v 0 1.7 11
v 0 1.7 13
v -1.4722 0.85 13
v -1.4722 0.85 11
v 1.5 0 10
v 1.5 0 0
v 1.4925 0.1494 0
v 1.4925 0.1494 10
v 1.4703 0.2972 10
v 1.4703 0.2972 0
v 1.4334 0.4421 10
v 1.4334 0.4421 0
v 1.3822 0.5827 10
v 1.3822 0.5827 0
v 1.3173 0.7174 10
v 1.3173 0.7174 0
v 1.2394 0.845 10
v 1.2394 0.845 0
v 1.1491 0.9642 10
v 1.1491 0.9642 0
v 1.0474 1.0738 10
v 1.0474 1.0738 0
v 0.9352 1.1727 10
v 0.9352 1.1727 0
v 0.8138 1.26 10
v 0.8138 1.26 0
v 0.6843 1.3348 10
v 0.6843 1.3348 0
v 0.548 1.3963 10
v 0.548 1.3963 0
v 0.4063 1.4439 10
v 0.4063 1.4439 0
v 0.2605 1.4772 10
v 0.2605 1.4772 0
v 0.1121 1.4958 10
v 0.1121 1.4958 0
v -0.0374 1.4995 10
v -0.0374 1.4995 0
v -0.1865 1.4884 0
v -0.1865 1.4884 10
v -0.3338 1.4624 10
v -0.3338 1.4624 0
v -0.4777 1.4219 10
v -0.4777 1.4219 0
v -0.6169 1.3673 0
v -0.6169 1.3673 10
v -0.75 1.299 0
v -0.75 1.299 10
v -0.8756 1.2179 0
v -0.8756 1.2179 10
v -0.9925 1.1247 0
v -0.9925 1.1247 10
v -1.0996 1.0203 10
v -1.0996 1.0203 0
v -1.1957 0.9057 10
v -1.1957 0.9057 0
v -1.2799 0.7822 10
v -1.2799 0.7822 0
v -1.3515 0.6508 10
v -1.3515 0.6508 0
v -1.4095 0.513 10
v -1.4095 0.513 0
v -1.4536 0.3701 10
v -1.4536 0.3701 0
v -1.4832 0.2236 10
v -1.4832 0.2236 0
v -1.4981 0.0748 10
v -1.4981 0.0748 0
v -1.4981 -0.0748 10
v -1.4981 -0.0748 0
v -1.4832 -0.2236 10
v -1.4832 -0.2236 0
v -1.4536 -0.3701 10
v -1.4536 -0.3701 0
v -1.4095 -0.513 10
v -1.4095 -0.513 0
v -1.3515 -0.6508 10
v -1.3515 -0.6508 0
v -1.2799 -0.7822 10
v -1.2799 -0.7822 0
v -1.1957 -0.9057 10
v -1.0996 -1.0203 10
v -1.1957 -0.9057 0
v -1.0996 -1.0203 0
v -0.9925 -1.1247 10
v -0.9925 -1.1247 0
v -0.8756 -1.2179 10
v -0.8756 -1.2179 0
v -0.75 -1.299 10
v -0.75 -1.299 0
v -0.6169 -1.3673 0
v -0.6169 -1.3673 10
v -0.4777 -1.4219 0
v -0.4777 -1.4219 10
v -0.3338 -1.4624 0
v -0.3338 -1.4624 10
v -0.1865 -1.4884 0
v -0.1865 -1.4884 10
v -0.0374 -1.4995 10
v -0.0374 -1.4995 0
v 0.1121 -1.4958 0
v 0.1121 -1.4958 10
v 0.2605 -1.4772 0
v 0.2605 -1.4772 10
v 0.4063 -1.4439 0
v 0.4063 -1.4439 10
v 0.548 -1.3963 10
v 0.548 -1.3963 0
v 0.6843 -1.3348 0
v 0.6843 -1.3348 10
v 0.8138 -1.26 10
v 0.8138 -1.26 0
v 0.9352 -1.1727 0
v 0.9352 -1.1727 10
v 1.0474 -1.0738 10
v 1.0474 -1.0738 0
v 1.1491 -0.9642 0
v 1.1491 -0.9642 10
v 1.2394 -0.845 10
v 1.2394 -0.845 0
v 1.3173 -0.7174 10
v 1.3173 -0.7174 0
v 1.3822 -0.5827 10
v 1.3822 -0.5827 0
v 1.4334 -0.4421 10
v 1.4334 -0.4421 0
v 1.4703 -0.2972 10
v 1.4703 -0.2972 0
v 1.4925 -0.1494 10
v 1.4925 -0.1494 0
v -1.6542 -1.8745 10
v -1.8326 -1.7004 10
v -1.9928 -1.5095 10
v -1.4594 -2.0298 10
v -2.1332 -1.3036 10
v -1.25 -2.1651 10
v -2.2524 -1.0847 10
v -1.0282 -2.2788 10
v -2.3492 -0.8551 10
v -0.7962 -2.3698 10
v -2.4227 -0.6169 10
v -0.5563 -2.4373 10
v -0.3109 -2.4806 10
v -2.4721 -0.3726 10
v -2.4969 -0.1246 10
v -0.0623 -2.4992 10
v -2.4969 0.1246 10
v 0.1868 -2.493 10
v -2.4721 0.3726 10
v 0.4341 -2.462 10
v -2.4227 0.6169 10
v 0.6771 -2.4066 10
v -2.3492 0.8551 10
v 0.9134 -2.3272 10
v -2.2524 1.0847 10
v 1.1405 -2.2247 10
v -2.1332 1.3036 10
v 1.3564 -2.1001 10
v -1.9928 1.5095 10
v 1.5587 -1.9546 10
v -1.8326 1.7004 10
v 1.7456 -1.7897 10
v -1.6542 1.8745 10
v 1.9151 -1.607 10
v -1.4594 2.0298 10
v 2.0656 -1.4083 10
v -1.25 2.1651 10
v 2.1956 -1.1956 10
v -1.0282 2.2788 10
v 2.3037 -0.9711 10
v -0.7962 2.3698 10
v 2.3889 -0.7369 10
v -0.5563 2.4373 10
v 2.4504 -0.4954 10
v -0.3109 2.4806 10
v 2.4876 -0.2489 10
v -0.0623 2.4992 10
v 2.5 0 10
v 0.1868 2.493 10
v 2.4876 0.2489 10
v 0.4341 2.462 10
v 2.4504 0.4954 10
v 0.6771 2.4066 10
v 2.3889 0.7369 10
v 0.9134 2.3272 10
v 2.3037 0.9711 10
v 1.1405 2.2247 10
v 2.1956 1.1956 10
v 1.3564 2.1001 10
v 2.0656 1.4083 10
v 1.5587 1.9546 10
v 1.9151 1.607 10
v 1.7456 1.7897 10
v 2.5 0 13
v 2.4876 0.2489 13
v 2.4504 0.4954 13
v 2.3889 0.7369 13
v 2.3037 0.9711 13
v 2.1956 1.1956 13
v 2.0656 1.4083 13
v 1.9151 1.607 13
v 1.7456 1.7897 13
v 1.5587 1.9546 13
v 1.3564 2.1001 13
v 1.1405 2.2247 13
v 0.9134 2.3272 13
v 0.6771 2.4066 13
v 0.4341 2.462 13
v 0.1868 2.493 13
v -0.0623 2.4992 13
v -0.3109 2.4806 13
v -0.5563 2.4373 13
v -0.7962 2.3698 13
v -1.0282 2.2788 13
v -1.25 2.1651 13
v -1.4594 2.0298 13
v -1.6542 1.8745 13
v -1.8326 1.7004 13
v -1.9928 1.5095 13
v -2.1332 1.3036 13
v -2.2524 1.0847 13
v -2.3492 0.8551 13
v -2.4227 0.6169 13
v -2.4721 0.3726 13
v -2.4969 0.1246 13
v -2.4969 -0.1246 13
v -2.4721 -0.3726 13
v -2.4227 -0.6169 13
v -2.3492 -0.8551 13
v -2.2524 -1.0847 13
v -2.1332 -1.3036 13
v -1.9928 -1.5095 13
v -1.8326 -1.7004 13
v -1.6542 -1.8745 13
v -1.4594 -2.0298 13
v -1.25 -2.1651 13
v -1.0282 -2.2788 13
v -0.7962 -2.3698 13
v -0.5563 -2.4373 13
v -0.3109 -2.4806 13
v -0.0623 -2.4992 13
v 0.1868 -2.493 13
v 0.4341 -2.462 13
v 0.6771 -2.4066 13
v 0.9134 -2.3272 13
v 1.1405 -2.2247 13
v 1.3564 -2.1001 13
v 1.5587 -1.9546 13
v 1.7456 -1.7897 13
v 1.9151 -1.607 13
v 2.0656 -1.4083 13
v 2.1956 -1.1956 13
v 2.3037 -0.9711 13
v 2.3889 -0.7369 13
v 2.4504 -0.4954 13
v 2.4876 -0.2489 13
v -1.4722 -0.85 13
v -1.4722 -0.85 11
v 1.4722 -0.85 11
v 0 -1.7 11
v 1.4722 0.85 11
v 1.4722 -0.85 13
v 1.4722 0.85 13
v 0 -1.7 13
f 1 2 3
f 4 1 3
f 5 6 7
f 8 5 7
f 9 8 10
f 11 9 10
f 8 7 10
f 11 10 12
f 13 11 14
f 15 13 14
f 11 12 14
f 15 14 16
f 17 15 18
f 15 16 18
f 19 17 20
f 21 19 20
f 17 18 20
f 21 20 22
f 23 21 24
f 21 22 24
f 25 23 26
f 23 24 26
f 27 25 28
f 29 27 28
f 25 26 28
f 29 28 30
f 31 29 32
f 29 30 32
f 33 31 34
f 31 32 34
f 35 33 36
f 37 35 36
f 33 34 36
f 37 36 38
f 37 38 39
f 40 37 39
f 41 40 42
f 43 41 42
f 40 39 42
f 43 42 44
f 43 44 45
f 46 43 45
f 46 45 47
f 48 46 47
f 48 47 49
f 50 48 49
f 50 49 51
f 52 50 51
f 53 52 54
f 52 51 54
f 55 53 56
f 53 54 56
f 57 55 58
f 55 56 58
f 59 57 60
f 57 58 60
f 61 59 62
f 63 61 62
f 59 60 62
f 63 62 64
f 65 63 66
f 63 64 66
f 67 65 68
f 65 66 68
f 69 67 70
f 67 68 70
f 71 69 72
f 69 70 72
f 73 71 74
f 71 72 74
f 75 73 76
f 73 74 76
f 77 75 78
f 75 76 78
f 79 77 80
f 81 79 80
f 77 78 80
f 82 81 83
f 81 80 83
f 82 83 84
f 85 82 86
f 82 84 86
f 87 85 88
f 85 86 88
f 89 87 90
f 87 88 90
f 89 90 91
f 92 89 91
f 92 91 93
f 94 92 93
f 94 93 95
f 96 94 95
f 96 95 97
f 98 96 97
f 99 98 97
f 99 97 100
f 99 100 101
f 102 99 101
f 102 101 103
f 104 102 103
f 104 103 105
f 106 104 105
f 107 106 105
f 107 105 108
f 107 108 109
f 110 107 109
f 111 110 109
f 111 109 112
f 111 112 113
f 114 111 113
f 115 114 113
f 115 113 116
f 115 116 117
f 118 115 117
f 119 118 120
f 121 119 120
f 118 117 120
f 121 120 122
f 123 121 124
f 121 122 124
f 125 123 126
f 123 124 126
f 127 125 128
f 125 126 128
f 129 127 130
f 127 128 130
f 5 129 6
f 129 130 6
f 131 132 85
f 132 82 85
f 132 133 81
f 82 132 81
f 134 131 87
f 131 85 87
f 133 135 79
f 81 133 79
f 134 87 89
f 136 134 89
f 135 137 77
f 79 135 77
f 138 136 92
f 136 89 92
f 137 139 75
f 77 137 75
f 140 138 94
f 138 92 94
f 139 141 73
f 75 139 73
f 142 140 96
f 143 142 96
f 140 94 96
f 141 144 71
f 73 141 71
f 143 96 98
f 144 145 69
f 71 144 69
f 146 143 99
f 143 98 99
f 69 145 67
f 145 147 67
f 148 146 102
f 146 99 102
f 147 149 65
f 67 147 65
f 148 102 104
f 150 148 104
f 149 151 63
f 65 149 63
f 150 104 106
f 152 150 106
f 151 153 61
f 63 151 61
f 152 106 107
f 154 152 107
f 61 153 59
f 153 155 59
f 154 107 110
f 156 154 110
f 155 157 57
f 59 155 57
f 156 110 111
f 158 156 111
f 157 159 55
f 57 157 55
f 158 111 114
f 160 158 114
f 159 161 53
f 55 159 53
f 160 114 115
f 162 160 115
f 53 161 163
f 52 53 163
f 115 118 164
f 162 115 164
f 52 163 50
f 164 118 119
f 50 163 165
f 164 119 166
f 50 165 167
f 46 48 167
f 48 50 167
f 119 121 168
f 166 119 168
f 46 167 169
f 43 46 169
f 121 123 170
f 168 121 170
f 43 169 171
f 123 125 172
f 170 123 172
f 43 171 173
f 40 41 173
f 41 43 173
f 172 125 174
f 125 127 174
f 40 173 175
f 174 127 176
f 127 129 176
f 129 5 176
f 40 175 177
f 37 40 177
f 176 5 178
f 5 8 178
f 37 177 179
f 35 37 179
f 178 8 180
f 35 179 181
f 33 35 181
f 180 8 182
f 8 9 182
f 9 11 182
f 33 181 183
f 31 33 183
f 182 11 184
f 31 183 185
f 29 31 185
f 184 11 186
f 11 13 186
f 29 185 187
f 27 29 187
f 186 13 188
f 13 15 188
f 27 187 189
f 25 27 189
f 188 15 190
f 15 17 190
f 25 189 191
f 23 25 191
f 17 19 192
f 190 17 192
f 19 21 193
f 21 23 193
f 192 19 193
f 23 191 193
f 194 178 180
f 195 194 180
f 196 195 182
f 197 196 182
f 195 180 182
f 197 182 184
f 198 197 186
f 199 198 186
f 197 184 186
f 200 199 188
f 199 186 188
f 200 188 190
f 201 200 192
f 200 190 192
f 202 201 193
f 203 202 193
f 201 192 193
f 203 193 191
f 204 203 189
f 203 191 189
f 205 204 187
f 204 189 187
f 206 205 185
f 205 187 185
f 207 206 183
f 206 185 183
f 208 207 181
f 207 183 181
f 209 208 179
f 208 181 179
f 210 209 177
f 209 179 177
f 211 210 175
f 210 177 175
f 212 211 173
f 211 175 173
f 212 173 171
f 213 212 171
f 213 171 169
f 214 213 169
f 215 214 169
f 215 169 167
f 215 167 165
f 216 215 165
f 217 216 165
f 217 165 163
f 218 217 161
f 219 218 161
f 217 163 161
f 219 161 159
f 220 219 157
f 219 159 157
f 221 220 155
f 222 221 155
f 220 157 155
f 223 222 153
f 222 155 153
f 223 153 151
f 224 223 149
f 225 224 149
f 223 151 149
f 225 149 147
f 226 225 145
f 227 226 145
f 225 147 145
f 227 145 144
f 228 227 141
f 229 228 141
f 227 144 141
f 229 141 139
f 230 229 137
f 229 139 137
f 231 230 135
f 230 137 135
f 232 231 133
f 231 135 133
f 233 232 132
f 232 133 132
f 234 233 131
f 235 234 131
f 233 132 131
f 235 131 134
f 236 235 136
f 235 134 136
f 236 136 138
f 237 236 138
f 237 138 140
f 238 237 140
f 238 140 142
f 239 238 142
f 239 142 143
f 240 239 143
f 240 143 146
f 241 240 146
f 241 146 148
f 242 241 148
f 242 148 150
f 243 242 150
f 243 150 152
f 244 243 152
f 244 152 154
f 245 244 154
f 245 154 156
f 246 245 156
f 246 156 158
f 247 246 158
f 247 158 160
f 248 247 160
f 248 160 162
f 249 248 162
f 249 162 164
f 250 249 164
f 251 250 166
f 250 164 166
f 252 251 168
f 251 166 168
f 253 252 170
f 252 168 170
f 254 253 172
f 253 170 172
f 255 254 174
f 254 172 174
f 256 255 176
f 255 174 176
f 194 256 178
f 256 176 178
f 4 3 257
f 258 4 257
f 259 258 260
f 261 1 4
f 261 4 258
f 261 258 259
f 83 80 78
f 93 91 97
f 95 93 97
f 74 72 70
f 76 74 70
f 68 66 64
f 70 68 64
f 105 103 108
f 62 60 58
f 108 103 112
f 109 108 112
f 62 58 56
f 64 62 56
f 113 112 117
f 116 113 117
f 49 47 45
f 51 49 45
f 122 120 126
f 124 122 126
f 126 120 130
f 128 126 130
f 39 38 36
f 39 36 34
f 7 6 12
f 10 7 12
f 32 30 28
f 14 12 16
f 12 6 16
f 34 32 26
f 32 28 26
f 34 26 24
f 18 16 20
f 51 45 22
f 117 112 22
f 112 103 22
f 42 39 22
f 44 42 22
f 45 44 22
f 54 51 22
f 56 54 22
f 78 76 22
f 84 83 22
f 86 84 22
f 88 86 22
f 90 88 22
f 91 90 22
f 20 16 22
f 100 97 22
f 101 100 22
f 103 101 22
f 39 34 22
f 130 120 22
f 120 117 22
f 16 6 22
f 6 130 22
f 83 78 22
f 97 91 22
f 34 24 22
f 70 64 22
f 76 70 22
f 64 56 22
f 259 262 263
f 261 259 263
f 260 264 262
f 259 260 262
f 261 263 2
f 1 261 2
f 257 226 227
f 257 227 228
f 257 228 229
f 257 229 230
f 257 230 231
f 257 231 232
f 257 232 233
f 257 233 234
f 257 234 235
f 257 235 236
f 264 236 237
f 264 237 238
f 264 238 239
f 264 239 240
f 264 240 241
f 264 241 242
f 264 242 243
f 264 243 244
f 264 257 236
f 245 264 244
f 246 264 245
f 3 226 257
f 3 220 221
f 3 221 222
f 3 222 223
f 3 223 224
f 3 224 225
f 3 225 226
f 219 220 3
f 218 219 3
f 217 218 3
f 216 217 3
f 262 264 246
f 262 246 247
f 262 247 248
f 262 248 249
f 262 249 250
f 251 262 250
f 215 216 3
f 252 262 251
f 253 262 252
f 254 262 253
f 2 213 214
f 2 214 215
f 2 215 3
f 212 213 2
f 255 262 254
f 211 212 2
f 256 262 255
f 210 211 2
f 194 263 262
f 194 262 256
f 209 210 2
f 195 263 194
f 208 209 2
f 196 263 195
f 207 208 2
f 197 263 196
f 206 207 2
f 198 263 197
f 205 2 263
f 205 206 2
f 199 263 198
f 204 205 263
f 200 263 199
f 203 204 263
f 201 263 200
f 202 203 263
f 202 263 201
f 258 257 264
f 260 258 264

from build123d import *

# Parameters (mm, degrees)
SKETCH_1_R          = 1.5
EXTRUDE_1_DEPTH     = 10
SKETCH_2_R          = 2.5
EXTRUDE_2_DEPTH     = 3
CUT_EXTRUDE_1_DEPTH = 2


with BuildPart() as part:
    # 草图1 → 凸台-拉伸1 (new body)
    with BuildSketch(Plane.XY):
        Circle(SKETCH_1_R)
    extrude(amount=EXTRUDE_1_DEPTH)

    # 草图2 → 凸台-拉伸2 (add)
    with BuildSketch(Plane.XY.offset(10)):
        Circle(SKETCH_2_R)
    extrude(amount=EXTRUDE_2_DEPTH)

    # 草图3 → 切除-拉伸1 (cut)
    with BuildSketch(Plane.XY.offset(13)):
        Polygon((0, 1.7), (-1.472243186, 0.85), (-1.472243186, -0.85), (0, -1.7), (1.472243186, -0.85), (1.472243186, 0.85), align=None)
    extrude(amount=-CUT_EXTRUDE_1_DEPTH, mode=Mode.SUBTRACT)


solid = part.part
